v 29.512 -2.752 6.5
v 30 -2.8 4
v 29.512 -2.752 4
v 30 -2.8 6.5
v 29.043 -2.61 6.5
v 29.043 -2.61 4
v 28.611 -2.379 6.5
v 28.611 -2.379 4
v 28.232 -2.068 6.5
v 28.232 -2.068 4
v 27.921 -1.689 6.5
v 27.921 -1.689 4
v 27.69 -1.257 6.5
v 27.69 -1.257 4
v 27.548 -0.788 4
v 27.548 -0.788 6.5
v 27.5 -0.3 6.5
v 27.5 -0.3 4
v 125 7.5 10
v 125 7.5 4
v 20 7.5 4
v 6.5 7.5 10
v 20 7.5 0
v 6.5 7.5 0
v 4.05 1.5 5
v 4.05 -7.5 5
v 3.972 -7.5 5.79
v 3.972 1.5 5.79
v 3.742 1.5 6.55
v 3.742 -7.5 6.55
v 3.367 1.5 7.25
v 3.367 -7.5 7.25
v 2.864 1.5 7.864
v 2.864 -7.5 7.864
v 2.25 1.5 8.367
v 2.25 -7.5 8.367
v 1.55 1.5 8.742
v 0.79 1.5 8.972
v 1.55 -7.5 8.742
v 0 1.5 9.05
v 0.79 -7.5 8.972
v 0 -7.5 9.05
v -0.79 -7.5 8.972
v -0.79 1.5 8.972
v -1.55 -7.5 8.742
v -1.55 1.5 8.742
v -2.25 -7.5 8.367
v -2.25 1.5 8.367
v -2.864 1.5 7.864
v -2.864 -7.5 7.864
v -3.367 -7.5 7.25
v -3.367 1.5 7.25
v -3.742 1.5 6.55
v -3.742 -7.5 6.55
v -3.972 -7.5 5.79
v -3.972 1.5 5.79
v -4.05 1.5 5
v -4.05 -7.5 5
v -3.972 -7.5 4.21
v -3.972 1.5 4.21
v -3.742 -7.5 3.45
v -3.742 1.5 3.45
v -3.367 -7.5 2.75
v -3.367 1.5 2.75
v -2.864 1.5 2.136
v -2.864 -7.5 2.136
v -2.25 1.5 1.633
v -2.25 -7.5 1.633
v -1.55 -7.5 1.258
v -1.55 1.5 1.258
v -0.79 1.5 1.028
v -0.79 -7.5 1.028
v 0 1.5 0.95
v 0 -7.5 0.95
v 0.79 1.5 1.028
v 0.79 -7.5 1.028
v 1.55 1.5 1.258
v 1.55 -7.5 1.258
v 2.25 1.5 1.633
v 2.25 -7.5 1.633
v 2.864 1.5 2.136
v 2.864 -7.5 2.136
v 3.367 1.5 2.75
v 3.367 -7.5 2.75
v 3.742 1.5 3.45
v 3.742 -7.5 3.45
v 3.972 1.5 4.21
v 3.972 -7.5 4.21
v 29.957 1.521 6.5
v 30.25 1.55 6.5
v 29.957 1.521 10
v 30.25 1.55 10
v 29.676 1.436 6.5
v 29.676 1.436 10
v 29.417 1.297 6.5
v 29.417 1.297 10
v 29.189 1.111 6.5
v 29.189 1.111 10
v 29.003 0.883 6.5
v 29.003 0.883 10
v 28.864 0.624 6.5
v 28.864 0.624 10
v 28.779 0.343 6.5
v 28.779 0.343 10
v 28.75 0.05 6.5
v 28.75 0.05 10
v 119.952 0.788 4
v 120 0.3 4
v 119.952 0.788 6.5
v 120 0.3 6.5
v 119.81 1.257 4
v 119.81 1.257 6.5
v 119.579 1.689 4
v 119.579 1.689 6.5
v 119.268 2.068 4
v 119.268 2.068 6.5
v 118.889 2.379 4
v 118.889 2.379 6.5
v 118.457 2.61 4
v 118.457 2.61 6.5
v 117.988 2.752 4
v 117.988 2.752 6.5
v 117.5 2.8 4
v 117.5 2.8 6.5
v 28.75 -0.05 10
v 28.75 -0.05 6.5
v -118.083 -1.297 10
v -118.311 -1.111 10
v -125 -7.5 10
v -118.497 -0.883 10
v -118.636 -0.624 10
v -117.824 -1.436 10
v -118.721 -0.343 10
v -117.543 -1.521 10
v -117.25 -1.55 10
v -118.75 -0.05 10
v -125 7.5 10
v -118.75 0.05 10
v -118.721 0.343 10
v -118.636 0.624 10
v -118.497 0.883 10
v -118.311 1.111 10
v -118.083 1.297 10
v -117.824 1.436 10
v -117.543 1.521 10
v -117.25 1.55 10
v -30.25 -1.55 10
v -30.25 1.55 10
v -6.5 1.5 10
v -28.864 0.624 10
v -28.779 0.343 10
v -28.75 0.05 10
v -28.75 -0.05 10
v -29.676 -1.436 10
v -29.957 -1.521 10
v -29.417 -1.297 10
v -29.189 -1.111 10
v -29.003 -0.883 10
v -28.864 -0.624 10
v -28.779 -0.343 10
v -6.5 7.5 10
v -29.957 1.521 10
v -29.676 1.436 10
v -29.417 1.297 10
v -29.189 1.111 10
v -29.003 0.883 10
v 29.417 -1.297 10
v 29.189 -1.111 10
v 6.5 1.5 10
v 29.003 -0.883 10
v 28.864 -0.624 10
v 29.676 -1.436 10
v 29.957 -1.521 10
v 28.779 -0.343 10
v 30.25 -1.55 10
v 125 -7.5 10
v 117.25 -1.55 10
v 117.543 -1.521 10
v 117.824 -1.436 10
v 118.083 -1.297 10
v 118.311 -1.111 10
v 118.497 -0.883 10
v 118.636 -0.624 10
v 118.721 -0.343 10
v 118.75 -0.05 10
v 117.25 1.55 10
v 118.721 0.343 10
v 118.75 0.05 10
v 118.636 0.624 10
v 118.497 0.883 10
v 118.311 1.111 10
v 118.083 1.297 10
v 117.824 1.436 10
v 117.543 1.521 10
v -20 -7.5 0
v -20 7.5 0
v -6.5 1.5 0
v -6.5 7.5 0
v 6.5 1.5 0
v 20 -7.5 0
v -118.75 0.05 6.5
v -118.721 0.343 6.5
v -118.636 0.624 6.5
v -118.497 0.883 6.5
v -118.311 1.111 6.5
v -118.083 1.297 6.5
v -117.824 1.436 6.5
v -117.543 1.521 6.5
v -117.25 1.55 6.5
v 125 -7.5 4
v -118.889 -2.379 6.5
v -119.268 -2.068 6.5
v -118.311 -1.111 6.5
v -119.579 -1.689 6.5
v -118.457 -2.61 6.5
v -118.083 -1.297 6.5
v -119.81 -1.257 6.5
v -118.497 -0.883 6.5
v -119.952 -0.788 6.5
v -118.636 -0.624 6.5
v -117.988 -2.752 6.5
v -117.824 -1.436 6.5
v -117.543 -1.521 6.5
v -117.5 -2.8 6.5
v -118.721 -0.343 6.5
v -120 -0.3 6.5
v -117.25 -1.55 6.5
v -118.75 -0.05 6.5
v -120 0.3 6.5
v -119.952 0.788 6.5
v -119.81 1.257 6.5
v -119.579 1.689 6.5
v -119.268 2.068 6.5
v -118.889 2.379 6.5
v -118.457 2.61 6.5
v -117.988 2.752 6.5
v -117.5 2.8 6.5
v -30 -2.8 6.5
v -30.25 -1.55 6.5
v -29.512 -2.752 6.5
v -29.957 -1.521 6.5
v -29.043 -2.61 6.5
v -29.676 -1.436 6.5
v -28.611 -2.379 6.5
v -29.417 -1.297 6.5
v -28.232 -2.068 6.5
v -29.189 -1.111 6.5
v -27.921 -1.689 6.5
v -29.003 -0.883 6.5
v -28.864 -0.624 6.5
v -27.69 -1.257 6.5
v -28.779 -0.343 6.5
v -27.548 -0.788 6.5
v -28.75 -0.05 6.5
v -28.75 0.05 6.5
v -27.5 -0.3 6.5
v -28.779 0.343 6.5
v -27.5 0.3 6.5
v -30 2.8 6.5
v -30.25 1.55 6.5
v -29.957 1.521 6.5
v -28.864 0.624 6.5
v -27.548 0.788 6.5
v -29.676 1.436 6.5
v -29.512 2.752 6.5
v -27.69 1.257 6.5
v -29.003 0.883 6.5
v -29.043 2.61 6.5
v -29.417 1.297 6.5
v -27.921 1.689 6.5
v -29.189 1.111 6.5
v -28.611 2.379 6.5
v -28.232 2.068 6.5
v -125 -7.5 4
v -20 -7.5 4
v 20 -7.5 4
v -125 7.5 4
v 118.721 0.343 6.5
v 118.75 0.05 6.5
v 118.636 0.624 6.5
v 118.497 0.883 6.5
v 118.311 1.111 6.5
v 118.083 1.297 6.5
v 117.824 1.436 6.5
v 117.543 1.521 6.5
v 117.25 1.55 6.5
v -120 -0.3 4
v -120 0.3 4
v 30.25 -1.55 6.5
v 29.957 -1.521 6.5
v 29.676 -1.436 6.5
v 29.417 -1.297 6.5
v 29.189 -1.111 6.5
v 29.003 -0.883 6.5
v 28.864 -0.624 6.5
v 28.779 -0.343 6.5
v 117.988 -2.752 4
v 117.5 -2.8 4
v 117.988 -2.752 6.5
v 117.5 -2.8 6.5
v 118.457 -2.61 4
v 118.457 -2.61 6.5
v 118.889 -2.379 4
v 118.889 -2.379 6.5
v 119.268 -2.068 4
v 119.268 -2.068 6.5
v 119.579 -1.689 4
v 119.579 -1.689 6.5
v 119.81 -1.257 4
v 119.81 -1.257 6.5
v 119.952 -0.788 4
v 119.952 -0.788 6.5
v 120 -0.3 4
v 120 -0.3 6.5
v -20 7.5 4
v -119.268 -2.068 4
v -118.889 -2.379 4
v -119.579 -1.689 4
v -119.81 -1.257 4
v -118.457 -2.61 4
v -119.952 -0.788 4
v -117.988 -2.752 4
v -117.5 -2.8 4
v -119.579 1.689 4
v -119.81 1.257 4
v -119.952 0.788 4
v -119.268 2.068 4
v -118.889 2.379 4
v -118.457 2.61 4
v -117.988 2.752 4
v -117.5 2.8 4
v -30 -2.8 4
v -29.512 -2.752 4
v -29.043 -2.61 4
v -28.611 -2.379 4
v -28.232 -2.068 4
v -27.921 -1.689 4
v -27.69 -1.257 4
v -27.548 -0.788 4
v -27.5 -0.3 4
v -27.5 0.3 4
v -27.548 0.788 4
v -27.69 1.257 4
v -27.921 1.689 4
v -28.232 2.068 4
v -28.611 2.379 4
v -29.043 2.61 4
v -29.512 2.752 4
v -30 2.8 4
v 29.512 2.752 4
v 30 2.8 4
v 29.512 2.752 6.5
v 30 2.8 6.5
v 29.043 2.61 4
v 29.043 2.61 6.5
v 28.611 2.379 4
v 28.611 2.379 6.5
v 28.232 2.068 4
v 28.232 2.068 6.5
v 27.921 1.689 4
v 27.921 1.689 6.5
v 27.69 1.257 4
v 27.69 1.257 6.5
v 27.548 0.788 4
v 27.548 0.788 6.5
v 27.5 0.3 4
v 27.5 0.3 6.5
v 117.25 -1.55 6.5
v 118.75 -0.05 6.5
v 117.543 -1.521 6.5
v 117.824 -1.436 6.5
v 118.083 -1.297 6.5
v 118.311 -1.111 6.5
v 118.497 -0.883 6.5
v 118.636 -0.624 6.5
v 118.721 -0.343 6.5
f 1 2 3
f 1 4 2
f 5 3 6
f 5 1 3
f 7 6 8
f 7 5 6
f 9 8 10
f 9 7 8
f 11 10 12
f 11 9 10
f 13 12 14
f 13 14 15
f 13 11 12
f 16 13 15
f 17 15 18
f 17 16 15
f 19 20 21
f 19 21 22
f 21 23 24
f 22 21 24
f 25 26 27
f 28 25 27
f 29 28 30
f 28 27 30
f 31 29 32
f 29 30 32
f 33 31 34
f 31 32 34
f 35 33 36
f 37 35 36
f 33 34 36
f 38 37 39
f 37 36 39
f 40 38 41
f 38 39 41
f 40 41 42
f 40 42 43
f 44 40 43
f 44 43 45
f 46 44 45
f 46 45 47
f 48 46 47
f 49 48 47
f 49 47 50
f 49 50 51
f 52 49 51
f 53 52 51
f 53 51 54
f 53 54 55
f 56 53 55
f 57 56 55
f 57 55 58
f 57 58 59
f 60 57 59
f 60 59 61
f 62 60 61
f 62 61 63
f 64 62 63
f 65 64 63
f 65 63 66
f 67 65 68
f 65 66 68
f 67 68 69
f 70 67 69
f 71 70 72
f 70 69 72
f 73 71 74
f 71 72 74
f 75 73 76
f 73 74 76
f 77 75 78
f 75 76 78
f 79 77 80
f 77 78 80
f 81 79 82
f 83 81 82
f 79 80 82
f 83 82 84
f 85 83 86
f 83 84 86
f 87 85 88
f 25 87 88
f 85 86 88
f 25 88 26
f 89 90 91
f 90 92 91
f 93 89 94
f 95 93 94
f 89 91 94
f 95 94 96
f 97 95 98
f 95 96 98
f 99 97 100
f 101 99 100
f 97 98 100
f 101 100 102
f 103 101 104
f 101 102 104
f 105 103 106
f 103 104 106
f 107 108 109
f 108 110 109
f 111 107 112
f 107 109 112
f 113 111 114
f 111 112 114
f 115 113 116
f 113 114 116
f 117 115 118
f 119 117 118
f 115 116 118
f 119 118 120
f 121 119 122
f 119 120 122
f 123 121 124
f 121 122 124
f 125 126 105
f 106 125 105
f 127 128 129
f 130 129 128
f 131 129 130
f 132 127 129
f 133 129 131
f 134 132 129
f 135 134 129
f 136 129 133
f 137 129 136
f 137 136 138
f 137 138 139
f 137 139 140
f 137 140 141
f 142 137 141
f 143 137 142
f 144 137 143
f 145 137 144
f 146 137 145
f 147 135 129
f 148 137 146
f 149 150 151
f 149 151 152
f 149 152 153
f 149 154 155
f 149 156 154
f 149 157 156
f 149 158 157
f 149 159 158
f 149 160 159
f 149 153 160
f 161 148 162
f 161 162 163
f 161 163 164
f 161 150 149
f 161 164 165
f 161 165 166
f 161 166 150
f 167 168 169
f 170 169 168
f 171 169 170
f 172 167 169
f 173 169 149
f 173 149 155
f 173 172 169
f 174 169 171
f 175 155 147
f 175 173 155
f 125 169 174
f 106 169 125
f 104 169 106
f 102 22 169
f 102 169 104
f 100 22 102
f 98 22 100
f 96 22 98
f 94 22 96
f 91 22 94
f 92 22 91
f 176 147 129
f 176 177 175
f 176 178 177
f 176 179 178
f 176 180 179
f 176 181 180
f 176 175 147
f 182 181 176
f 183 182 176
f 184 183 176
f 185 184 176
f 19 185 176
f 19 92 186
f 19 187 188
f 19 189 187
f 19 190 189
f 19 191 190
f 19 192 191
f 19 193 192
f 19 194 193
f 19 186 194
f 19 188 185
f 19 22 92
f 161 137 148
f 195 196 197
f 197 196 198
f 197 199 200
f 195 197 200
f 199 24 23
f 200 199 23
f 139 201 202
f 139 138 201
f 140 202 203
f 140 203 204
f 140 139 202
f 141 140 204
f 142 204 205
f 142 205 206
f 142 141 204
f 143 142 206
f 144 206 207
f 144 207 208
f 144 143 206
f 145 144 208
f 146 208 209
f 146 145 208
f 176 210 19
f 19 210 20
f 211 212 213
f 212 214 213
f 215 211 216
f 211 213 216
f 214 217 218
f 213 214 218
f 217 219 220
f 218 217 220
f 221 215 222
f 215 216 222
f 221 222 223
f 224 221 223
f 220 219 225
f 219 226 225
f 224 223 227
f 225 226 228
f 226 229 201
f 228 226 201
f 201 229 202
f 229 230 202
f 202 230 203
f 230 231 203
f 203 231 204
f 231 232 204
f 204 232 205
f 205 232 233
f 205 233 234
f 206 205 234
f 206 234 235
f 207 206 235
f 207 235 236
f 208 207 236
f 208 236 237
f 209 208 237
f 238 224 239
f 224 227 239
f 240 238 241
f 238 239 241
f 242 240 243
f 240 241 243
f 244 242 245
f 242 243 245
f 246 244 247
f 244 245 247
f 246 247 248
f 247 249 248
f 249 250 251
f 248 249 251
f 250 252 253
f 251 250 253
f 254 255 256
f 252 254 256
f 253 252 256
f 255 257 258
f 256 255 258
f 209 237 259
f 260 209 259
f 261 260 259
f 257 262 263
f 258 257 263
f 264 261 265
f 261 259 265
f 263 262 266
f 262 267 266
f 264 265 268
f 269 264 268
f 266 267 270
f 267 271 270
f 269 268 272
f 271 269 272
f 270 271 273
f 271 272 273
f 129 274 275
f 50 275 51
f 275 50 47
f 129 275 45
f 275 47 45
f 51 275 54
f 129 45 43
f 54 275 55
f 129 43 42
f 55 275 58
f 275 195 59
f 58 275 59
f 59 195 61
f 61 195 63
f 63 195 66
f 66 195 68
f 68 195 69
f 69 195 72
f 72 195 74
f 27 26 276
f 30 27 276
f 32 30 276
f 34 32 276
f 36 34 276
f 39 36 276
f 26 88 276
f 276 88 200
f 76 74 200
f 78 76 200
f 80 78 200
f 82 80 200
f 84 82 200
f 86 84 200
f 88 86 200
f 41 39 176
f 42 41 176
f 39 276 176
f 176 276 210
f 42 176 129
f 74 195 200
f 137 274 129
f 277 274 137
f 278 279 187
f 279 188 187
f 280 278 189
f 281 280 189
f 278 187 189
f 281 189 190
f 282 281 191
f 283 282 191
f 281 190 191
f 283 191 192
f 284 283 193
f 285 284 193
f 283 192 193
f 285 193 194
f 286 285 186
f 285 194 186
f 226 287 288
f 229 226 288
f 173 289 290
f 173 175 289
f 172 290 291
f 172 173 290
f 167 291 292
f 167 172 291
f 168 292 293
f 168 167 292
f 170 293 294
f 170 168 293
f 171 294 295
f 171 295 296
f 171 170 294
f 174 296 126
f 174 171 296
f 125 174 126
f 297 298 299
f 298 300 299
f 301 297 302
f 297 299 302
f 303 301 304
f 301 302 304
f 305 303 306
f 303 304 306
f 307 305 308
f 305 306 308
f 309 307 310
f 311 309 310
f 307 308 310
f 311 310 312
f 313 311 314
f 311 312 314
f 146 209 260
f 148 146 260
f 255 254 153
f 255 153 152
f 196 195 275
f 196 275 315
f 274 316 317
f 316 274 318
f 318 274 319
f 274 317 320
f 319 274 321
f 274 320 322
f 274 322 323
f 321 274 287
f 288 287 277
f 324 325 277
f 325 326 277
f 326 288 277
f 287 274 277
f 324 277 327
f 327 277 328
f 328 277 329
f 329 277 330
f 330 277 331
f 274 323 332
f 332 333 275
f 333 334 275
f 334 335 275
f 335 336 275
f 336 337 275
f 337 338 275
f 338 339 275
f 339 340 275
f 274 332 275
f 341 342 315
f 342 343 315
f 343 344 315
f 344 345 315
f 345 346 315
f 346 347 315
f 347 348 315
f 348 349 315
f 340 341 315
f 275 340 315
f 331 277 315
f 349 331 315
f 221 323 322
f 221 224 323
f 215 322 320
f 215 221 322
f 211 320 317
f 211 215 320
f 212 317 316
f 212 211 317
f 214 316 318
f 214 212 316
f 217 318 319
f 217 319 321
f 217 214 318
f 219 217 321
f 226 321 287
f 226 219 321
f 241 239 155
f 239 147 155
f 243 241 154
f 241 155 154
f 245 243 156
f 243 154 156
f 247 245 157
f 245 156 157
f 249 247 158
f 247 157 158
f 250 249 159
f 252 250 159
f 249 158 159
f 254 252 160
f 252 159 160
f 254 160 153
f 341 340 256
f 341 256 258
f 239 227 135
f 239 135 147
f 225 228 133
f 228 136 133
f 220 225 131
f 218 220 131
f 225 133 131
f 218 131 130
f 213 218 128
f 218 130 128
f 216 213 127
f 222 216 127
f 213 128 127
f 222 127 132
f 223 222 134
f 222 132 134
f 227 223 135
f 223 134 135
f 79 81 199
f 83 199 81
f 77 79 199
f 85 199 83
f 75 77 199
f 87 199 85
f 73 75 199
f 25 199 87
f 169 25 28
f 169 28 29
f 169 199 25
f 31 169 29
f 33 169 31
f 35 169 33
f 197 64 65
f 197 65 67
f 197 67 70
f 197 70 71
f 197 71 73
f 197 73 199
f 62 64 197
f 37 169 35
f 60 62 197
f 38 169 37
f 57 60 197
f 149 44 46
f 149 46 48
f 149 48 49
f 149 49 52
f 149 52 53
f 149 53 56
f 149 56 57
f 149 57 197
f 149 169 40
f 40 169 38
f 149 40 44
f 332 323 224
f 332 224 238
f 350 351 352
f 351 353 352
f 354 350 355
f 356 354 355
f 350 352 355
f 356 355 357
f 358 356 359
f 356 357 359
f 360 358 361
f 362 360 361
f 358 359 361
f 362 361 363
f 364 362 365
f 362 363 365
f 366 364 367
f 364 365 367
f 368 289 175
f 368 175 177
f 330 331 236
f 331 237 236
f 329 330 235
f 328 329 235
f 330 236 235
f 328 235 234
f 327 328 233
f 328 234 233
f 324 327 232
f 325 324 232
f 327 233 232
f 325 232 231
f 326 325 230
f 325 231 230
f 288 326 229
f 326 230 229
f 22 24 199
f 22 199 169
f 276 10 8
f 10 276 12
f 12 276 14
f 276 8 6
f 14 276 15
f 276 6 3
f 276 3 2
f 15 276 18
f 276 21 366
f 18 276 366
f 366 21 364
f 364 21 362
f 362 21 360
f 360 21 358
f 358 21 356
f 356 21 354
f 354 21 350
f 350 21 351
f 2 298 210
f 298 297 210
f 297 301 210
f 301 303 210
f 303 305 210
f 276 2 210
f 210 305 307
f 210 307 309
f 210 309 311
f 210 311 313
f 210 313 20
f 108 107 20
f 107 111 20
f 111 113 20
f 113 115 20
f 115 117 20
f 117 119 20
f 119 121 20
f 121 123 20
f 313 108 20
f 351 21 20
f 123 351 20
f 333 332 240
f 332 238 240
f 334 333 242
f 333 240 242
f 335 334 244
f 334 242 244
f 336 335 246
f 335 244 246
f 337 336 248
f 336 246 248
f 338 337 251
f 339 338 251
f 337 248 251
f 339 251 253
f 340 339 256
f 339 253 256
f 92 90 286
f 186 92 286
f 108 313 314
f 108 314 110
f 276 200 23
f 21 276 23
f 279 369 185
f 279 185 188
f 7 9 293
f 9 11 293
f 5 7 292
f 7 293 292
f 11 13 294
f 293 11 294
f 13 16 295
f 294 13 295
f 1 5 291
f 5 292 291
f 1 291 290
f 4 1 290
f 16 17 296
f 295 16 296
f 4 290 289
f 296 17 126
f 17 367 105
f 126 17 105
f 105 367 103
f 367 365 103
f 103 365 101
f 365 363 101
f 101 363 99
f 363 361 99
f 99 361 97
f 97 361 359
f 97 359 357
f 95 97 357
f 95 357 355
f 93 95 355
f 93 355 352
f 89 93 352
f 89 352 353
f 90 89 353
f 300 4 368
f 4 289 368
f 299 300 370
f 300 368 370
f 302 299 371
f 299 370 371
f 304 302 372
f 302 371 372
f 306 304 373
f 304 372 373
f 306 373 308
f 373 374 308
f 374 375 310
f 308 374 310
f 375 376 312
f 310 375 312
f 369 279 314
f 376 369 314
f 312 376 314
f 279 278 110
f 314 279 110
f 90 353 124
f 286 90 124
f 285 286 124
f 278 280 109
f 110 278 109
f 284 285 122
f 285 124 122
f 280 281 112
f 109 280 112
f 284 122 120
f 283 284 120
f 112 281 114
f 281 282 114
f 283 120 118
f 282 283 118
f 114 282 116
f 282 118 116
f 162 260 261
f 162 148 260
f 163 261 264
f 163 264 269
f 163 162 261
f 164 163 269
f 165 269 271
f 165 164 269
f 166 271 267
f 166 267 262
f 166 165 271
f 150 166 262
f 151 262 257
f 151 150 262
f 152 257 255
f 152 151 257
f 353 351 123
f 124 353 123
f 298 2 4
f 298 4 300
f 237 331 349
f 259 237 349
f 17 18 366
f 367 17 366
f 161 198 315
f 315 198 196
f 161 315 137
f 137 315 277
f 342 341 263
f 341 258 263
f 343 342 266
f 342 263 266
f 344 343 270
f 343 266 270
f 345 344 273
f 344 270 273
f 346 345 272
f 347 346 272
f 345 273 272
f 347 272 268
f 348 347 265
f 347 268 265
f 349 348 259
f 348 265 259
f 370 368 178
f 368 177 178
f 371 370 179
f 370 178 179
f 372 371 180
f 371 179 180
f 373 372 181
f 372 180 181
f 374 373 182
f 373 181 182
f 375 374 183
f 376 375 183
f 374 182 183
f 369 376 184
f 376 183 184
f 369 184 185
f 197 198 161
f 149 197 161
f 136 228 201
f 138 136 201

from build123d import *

# Parameters (mm, degrees)
F0_W     = 105
F0_H     = 15
F0_W_2   = 92.5
F0_H_2   = 5.6
F0_W_3   = 90
F0_H_3   = 3.1
F0_W_4   = 40
F1_DEPTH = 10
F2_DEPTH = 6.5
F3_W     = 13
F3_H     = 10
F4_DEPTH = 6
F5_D     = 8.1
F5_DEPTH = 22
F5_START = 6
F5_TIP   = 2.4334855071
F6_DEPTH = 4
F7_R     = 2.5
F8_R     = 1.5


with BuildPart() as f1:
    # F0 (on Top) → F1 (new body)
    with BuildSketch(Plane.XY):
        with Locations((72.5, 0)):
            Rectangle(F0_W, F0_H)
        with Locations((73.75, 0)):
            Rectangle(F0_W_2, F0_H_2, mode=Mode.SUBTRACT)
        with Locations((-72.5, 0)):
            Rectangle(F0_W, F0_H)
        with Locations((-73.75, 0)):
            Rectangle(F0_W_2, F0_H_2, mode=Mode.SUBTRACT)
        with Locations((-73.75, 0)):
            Rectangle(F0_W_2, F0_H_2)
        with Locations((-73.75, 0)):
            Rectangle(F0_W_3, F0_H_3, mode=Mode.SUBTRACT)
        with Locations((73.75, 0)):
            Rectangle(F0_W_2, F0_H_2)
        with Locations((73.75, 0)):
            Rectangle(F0_W_3, F0_H_3, mode=Mode.SUBTRACT)
        Rectangle(F0_W_4, F0_H)
    extrude(amount=F1_DEPTH)

    # F0 (on Top) → F2 (cut)
    with BuildSketch(Plane.XY):
        with Locations((73.75, 0)):
            Rectangle(F0_W_2, F0_H_2)
        with Locations((73.75, 0)):
            Rectangle(F0_W_3, F0_H_3, mode=Mode.SUBTRACT)
        with Locations((-73.75, 0)):
            Rectangle(F0_W_2, F0_H_2)
        with Locations((-73.75, 0)):
            Rectangle(F0_W_3, F0_H_3, mode=Mode.SUBTRACT)
    extrude(amount=F2_DEPTH, mode=Mode.SUBTRACT)

    # F3 (on face) → F4 (cut)
    with BuildSketch(Plane(origin=(0, 7.5, 0), x_dir=(-1, 0, 0), z_dir=(0, 1, 0))):
        with Locations((0, 5)):
            Rectangle(F3_W, F3_H)
    extrude(amount=-F4_DEPTH, mode=Mode.SUBTRACT)

    # F5
    # its depths count from where the whole tool has entered the part; down to there all is cleared
    with Locations(Plane(origin=(0, 7.5, 0), x_dir=(-1, 0, 0), z_dir=(0, 1, 0)).offset(-F5_START)):
        with Locations((0, 5)):
            Hole(F5_D / 2, depth=F5_DEPTH)
            with Locations((0, 0, -(F5_DEPTH + F5_TIP / 2))):  # 118° drill point
                Cone(0, F5_D / 2, F5_TIP, mode=Mode.SUBTRACT)

    # F0 (on Top) → F6 (cut)
    with BuildSketch(Plane.XY):
        with Locations((-72.5, 0)):
            Rectangle(F0_W, F0_H)
        with Locations((-73.75, 0)):
            Rectangle(F0_W_2, F0_H_2, mode=Mode.SUBTRACT)
        with Locations((72.5, 0)):
            Rectangle(F0_W, F0_H)
        with Locations((73.75, 0)):
            Rectangle(F0_W_2, F0_H_2, mode=Mode.SUBTRACT)
    extrude(amount=F6_DEPTH, mode=Mode.SUBTRACT)

    # F7
    f7_edges = [f1.edges().sort_by_distance(p)[0] for p in [
        (-27.5, 2.8, 5.25),
        (-27.5, -2.8, 5.25),
        (-120, 2.8, 5.25),
        (-120, -2.8, 5.25),
        (27.5, -2.8, 5.25),
        (120, -2.8, 5.25),
        (120, 2.8, 5.25),
        (27.5, 2.8, 5.25),
    ]]
    fillet(f7_edges, radius=F7_R)

    # F8
    f8_edges = [f1.edges().sort_by_distance(p)[0] for p in [
        (28.75, 1.55, 8.25),
        (28.75, -1.55, 8.25),
        (118.75, 1.55, 8.25),
        (118.75, -1.55, 8.25),
        (-28.75, -1.55, 8.25),
        (-28.75, 1.55, 8.25),
        (-118.75, 1.55, 8.25),
        (-118.75, -1.55, 8.25),
    ]]
    fillet(f8_edges, radius=F8_R)


solid = f1.part
